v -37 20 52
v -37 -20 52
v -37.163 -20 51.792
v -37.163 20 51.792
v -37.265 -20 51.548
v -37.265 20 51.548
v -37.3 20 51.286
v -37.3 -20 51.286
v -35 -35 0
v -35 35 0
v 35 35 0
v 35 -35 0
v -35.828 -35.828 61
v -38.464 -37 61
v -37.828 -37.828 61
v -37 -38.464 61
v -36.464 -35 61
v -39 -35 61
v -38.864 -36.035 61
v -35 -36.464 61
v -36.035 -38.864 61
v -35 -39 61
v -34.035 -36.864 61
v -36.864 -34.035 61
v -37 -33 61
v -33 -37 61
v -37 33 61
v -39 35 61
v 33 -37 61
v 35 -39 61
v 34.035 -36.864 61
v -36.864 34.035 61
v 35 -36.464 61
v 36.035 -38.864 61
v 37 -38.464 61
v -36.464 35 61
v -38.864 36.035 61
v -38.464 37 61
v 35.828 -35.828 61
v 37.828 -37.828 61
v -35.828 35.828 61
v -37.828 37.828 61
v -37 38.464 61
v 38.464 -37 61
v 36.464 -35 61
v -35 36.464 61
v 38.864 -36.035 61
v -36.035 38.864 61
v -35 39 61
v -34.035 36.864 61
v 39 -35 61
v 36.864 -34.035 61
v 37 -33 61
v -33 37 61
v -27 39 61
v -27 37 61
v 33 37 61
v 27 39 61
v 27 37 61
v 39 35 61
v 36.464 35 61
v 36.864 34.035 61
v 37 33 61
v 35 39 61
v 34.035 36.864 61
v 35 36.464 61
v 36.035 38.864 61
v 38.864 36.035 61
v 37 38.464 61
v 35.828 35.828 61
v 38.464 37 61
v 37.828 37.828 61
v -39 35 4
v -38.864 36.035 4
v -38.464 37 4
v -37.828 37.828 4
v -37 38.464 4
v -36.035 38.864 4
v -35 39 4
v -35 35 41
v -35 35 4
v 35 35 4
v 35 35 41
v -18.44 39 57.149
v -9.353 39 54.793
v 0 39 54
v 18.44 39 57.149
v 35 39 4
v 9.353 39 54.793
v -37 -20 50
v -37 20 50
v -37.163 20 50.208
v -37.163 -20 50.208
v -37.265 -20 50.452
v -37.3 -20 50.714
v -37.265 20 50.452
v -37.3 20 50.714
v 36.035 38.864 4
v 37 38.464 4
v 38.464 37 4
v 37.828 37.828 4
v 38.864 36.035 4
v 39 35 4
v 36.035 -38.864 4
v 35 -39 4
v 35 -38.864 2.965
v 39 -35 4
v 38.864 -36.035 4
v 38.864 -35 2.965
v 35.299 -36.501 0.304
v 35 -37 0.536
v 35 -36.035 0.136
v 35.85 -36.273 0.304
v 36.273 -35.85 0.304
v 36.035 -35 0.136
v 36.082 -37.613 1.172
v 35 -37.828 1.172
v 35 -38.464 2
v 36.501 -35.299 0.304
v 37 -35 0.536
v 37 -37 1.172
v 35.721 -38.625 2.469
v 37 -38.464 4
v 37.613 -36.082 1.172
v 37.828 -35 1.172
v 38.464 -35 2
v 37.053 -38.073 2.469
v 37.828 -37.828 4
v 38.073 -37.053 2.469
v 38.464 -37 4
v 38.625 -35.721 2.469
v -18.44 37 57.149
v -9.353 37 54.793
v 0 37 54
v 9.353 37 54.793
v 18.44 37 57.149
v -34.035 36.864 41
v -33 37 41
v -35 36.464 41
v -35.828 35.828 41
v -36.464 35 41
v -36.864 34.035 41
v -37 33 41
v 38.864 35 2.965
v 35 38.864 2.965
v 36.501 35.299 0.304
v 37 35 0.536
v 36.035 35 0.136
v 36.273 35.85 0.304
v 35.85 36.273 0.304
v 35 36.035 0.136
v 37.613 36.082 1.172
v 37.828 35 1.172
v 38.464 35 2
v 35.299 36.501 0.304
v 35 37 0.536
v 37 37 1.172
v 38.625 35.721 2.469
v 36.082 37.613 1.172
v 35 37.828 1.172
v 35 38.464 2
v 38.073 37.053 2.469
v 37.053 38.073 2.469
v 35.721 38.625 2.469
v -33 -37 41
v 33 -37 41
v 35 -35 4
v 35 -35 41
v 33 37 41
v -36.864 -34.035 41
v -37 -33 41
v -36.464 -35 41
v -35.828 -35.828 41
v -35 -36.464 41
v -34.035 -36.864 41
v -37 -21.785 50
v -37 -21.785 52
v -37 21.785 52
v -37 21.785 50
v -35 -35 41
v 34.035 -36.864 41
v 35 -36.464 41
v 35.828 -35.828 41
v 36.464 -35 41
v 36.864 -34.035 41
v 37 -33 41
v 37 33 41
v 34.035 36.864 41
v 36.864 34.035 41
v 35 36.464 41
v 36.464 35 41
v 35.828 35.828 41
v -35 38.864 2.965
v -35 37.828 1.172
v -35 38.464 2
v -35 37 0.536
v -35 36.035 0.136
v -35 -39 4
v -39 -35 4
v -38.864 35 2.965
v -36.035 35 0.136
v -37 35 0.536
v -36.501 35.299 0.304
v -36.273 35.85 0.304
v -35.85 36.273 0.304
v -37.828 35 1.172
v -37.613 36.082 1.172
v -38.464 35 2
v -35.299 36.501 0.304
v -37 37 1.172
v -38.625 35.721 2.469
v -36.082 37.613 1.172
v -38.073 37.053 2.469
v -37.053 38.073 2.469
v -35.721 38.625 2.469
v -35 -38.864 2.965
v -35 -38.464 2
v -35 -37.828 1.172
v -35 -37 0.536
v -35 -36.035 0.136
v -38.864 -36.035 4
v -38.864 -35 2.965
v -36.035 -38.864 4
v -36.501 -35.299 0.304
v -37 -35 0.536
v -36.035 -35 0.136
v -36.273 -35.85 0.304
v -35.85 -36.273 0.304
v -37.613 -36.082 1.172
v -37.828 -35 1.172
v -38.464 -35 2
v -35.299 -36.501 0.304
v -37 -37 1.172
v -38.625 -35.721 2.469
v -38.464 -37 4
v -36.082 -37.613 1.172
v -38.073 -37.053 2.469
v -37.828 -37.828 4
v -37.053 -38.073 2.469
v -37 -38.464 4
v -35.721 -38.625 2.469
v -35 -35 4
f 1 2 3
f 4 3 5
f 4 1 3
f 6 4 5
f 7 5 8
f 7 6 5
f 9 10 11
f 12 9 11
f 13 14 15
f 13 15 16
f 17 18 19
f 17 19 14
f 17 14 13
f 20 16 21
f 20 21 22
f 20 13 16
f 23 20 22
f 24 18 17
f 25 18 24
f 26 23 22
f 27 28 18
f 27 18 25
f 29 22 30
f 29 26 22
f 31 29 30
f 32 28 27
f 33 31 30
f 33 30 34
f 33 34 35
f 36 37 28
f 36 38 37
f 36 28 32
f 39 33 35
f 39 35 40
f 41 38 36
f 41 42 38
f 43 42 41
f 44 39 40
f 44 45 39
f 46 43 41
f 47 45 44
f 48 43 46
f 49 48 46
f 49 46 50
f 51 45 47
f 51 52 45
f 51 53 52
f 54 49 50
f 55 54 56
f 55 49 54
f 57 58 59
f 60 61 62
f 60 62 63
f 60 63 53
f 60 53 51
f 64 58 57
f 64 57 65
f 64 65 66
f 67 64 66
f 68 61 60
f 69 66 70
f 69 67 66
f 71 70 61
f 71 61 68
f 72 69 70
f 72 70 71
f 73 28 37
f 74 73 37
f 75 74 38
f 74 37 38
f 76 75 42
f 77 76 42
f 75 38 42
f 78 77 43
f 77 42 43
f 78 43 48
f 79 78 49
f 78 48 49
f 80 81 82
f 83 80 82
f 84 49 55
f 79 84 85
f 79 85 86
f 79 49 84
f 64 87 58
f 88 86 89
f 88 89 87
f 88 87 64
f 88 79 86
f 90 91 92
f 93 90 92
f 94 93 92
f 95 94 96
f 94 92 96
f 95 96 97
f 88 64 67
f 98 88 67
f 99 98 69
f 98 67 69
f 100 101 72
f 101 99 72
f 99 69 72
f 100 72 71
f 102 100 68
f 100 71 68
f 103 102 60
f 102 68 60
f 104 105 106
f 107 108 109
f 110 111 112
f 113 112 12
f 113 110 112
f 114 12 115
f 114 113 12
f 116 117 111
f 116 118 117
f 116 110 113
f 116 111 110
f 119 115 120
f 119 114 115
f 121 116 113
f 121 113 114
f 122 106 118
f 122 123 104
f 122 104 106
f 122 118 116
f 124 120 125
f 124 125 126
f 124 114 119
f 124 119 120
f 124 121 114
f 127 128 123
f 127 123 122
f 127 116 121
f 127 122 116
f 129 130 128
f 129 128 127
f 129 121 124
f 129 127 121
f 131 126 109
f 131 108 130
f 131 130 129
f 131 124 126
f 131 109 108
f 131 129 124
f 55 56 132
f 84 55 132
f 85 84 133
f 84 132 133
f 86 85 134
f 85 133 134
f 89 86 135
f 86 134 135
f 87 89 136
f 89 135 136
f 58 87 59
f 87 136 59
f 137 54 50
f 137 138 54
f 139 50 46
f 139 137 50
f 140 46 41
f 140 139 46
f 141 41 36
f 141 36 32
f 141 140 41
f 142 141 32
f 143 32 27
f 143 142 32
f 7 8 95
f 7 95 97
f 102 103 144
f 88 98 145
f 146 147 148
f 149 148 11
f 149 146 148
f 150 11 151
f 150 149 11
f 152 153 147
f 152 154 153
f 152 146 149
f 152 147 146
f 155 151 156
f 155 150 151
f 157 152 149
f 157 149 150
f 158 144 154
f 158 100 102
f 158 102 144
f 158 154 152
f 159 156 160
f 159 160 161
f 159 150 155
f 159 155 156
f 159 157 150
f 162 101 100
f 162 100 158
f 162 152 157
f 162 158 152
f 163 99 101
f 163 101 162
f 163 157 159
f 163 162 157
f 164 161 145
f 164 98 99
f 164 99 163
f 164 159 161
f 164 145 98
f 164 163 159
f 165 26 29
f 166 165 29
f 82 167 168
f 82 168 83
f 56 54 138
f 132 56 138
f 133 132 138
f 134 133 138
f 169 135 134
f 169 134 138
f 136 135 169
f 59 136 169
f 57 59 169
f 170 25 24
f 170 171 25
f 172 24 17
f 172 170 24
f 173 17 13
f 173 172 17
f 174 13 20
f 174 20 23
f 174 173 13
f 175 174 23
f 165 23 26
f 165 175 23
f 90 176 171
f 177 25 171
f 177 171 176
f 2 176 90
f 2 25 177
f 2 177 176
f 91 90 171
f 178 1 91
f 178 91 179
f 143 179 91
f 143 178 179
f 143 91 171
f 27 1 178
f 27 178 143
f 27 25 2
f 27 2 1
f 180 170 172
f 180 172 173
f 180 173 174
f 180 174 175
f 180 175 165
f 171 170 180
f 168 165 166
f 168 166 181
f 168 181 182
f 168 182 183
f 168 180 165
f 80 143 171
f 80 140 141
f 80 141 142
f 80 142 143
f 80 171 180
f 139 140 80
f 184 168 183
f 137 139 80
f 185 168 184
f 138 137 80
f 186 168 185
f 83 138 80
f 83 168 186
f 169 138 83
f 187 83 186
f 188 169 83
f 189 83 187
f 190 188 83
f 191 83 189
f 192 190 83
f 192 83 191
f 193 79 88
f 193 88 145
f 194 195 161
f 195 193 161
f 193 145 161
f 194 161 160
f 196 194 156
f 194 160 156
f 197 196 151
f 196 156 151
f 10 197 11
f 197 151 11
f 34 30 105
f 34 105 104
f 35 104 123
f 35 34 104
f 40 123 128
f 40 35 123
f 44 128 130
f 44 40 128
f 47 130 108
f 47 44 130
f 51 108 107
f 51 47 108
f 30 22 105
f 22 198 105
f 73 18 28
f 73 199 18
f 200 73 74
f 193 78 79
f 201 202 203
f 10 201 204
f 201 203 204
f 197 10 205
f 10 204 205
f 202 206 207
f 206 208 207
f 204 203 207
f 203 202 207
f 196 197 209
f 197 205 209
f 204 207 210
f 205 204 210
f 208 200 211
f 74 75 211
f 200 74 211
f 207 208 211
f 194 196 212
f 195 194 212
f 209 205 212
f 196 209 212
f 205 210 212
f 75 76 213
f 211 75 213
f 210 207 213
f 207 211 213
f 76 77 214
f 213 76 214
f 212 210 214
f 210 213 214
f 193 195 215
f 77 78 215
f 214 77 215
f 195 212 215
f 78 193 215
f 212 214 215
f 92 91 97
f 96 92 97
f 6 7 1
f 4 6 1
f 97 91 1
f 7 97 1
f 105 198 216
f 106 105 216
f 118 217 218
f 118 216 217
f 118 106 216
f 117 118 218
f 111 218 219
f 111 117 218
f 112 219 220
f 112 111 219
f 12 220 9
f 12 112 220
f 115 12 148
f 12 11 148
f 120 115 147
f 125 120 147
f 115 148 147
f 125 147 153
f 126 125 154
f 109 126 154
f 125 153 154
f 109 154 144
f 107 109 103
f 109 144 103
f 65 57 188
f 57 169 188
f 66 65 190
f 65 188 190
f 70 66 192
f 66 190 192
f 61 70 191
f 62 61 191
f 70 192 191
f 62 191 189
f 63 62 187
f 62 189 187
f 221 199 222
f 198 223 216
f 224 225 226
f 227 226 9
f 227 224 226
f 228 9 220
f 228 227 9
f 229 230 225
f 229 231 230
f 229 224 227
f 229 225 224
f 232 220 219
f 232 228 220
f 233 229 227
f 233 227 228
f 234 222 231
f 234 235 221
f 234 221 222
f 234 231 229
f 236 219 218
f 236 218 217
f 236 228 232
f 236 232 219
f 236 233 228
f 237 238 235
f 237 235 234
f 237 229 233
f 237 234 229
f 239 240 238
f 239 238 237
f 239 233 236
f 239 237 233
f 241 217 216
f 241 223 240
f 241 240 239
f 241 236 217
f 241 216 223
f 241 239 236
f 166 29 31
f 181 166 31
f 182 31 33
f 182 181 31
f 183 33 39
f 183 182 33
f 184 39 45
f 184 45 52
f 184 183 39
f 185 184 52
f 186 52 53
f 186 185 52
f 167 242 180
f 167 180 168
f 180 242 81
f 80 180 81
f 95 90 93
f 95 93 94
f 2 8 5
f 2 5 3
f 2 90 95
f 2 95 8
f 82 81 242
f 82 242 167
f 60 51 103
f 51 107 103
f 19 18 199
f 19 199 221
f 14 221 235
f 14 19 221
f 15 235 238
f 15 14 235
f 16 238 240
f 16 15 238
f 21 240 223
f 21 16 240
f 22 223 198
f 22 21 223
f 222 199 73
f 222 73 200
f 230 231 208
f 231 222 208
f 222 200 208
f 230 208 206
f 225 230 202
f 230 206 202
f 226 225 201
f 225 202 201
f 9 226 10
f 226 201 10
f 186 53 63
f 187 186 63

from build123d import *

# Parameters (mm, degrees)
F0_W         = 78
F0_H         = 78
F1_DEPTH     = 61
F2_T         = -4
F3_W         = 74
F3_H         = 74
F3_W_2       = 70
F3_H_2       = 70
F4_DEPTH     = 20
F6_DEPTH     = 2
F7_R         = 4
F8_R         = 4
F9_W         = 40
F9_H         = 2
F10_DEPTH    = 0.3
F11_T1_DEPTH = 43.5707142143


# Not quite as in the source:
# - a fillet or chamfer that OpenCascade refuses, or shapes differently, is made with other operations: its cross-section is extruded or revolved along the edge and cut away or added


with BuildPart() as f1:
    # F0 (on Top) → F1 (new body)
    with BuildSketch(Plane.XY):
        Rectangle(F0_W, F0_H)
    extrude(amount=F1_DEPTH)

    # F2
    f2_openings = [f1.faces().sort_by_distance(p)[0] for p in [
        (0, 0, 61),
    ]]
    offset(amount=F2_T, openings=f2_openings)

    # F3 (on face) → F4 (cut)
    with BuildSketch(Plane.XY.offset(61)):
        Rectangle(F3_W, F3_H)
        Rectangle(F3_W_2, F3_H_2, mode=Mode.SUBTRACT)
    extrude(amount=-F4_DEPTH, mode=Mode.SUBTRACT)

    # F5 (on face) → F6 (cut)
    with BuildSketch(Plane.XZ.offset(-37)):
        with BuildLine():
            Line((27, 61), (-27, 61))
            ThreePointArc((-27, 61), (0, 54), (27, 61))
        make_face()
    extrude(amount=-F6_DEPTH, mode=Mode.SUBTRACT)

    # F7
    f7_edges = [f1.edges().sort_by_distance(p)[0] for p in [
        (-39, 39, 30.5),
        (39, 39, 30.5),
        (39, -39, 30.5),
        (-39, -39, 30.5),
        (-39, 0, 0),
        (0, -39, 0),
        (39, 0, 0),
        (0, 39, 0),
    ]]
    fillet(f7_edges, radius=F7_R)

    # F8
    f8_edges = [f1.edges().sort_by_distance(p)[0] for p in [
        (37, -37, 51),
        (-37, -37, 51),
        (37, 37, 51),
        (-37, 37, 51),
    ]]
    fillet(f8_edges, radius=F8_R)

    # F9 (on face) → F10 (cut)
    with BuildSketch(Plane.YZ.offset(-37)):
        with Locations((0, 51)):
            Rectangle(F9_W, F9_H)
    extrude(amount=-F10_DEPTH, mode=Mode.SUBTRACT)

    # F11: fillet of radius 1 on 2 edges, made by hand

    # F11_s2 → F11_t1 (join)
    with BuildSketch(Plane.XZ.offset(-21.7853571071)):
        with BuildLine():
            ThreePointArc((-37, 50), (-37.2219544457, 50.3268445082), (-37.3, 50.7141428429))
            Line((-37.3, 50.7141428429), (-37.3, 50))
            Line((-37.3, 50), (-37, 50))
        make_face()
        with BuildLine():
            ThreePointArc((-37, 52), (-37.2219544457, 51.6731554918), (-37.3, 51.2858571571))
            Line((-37.3, 51.2858571571), (-37.3, 52))
            Line((-37.3, 52), (-37, 52))
        make_face()
    extrude(amount=F11_T1_DEPTH)


solid = f1.part
